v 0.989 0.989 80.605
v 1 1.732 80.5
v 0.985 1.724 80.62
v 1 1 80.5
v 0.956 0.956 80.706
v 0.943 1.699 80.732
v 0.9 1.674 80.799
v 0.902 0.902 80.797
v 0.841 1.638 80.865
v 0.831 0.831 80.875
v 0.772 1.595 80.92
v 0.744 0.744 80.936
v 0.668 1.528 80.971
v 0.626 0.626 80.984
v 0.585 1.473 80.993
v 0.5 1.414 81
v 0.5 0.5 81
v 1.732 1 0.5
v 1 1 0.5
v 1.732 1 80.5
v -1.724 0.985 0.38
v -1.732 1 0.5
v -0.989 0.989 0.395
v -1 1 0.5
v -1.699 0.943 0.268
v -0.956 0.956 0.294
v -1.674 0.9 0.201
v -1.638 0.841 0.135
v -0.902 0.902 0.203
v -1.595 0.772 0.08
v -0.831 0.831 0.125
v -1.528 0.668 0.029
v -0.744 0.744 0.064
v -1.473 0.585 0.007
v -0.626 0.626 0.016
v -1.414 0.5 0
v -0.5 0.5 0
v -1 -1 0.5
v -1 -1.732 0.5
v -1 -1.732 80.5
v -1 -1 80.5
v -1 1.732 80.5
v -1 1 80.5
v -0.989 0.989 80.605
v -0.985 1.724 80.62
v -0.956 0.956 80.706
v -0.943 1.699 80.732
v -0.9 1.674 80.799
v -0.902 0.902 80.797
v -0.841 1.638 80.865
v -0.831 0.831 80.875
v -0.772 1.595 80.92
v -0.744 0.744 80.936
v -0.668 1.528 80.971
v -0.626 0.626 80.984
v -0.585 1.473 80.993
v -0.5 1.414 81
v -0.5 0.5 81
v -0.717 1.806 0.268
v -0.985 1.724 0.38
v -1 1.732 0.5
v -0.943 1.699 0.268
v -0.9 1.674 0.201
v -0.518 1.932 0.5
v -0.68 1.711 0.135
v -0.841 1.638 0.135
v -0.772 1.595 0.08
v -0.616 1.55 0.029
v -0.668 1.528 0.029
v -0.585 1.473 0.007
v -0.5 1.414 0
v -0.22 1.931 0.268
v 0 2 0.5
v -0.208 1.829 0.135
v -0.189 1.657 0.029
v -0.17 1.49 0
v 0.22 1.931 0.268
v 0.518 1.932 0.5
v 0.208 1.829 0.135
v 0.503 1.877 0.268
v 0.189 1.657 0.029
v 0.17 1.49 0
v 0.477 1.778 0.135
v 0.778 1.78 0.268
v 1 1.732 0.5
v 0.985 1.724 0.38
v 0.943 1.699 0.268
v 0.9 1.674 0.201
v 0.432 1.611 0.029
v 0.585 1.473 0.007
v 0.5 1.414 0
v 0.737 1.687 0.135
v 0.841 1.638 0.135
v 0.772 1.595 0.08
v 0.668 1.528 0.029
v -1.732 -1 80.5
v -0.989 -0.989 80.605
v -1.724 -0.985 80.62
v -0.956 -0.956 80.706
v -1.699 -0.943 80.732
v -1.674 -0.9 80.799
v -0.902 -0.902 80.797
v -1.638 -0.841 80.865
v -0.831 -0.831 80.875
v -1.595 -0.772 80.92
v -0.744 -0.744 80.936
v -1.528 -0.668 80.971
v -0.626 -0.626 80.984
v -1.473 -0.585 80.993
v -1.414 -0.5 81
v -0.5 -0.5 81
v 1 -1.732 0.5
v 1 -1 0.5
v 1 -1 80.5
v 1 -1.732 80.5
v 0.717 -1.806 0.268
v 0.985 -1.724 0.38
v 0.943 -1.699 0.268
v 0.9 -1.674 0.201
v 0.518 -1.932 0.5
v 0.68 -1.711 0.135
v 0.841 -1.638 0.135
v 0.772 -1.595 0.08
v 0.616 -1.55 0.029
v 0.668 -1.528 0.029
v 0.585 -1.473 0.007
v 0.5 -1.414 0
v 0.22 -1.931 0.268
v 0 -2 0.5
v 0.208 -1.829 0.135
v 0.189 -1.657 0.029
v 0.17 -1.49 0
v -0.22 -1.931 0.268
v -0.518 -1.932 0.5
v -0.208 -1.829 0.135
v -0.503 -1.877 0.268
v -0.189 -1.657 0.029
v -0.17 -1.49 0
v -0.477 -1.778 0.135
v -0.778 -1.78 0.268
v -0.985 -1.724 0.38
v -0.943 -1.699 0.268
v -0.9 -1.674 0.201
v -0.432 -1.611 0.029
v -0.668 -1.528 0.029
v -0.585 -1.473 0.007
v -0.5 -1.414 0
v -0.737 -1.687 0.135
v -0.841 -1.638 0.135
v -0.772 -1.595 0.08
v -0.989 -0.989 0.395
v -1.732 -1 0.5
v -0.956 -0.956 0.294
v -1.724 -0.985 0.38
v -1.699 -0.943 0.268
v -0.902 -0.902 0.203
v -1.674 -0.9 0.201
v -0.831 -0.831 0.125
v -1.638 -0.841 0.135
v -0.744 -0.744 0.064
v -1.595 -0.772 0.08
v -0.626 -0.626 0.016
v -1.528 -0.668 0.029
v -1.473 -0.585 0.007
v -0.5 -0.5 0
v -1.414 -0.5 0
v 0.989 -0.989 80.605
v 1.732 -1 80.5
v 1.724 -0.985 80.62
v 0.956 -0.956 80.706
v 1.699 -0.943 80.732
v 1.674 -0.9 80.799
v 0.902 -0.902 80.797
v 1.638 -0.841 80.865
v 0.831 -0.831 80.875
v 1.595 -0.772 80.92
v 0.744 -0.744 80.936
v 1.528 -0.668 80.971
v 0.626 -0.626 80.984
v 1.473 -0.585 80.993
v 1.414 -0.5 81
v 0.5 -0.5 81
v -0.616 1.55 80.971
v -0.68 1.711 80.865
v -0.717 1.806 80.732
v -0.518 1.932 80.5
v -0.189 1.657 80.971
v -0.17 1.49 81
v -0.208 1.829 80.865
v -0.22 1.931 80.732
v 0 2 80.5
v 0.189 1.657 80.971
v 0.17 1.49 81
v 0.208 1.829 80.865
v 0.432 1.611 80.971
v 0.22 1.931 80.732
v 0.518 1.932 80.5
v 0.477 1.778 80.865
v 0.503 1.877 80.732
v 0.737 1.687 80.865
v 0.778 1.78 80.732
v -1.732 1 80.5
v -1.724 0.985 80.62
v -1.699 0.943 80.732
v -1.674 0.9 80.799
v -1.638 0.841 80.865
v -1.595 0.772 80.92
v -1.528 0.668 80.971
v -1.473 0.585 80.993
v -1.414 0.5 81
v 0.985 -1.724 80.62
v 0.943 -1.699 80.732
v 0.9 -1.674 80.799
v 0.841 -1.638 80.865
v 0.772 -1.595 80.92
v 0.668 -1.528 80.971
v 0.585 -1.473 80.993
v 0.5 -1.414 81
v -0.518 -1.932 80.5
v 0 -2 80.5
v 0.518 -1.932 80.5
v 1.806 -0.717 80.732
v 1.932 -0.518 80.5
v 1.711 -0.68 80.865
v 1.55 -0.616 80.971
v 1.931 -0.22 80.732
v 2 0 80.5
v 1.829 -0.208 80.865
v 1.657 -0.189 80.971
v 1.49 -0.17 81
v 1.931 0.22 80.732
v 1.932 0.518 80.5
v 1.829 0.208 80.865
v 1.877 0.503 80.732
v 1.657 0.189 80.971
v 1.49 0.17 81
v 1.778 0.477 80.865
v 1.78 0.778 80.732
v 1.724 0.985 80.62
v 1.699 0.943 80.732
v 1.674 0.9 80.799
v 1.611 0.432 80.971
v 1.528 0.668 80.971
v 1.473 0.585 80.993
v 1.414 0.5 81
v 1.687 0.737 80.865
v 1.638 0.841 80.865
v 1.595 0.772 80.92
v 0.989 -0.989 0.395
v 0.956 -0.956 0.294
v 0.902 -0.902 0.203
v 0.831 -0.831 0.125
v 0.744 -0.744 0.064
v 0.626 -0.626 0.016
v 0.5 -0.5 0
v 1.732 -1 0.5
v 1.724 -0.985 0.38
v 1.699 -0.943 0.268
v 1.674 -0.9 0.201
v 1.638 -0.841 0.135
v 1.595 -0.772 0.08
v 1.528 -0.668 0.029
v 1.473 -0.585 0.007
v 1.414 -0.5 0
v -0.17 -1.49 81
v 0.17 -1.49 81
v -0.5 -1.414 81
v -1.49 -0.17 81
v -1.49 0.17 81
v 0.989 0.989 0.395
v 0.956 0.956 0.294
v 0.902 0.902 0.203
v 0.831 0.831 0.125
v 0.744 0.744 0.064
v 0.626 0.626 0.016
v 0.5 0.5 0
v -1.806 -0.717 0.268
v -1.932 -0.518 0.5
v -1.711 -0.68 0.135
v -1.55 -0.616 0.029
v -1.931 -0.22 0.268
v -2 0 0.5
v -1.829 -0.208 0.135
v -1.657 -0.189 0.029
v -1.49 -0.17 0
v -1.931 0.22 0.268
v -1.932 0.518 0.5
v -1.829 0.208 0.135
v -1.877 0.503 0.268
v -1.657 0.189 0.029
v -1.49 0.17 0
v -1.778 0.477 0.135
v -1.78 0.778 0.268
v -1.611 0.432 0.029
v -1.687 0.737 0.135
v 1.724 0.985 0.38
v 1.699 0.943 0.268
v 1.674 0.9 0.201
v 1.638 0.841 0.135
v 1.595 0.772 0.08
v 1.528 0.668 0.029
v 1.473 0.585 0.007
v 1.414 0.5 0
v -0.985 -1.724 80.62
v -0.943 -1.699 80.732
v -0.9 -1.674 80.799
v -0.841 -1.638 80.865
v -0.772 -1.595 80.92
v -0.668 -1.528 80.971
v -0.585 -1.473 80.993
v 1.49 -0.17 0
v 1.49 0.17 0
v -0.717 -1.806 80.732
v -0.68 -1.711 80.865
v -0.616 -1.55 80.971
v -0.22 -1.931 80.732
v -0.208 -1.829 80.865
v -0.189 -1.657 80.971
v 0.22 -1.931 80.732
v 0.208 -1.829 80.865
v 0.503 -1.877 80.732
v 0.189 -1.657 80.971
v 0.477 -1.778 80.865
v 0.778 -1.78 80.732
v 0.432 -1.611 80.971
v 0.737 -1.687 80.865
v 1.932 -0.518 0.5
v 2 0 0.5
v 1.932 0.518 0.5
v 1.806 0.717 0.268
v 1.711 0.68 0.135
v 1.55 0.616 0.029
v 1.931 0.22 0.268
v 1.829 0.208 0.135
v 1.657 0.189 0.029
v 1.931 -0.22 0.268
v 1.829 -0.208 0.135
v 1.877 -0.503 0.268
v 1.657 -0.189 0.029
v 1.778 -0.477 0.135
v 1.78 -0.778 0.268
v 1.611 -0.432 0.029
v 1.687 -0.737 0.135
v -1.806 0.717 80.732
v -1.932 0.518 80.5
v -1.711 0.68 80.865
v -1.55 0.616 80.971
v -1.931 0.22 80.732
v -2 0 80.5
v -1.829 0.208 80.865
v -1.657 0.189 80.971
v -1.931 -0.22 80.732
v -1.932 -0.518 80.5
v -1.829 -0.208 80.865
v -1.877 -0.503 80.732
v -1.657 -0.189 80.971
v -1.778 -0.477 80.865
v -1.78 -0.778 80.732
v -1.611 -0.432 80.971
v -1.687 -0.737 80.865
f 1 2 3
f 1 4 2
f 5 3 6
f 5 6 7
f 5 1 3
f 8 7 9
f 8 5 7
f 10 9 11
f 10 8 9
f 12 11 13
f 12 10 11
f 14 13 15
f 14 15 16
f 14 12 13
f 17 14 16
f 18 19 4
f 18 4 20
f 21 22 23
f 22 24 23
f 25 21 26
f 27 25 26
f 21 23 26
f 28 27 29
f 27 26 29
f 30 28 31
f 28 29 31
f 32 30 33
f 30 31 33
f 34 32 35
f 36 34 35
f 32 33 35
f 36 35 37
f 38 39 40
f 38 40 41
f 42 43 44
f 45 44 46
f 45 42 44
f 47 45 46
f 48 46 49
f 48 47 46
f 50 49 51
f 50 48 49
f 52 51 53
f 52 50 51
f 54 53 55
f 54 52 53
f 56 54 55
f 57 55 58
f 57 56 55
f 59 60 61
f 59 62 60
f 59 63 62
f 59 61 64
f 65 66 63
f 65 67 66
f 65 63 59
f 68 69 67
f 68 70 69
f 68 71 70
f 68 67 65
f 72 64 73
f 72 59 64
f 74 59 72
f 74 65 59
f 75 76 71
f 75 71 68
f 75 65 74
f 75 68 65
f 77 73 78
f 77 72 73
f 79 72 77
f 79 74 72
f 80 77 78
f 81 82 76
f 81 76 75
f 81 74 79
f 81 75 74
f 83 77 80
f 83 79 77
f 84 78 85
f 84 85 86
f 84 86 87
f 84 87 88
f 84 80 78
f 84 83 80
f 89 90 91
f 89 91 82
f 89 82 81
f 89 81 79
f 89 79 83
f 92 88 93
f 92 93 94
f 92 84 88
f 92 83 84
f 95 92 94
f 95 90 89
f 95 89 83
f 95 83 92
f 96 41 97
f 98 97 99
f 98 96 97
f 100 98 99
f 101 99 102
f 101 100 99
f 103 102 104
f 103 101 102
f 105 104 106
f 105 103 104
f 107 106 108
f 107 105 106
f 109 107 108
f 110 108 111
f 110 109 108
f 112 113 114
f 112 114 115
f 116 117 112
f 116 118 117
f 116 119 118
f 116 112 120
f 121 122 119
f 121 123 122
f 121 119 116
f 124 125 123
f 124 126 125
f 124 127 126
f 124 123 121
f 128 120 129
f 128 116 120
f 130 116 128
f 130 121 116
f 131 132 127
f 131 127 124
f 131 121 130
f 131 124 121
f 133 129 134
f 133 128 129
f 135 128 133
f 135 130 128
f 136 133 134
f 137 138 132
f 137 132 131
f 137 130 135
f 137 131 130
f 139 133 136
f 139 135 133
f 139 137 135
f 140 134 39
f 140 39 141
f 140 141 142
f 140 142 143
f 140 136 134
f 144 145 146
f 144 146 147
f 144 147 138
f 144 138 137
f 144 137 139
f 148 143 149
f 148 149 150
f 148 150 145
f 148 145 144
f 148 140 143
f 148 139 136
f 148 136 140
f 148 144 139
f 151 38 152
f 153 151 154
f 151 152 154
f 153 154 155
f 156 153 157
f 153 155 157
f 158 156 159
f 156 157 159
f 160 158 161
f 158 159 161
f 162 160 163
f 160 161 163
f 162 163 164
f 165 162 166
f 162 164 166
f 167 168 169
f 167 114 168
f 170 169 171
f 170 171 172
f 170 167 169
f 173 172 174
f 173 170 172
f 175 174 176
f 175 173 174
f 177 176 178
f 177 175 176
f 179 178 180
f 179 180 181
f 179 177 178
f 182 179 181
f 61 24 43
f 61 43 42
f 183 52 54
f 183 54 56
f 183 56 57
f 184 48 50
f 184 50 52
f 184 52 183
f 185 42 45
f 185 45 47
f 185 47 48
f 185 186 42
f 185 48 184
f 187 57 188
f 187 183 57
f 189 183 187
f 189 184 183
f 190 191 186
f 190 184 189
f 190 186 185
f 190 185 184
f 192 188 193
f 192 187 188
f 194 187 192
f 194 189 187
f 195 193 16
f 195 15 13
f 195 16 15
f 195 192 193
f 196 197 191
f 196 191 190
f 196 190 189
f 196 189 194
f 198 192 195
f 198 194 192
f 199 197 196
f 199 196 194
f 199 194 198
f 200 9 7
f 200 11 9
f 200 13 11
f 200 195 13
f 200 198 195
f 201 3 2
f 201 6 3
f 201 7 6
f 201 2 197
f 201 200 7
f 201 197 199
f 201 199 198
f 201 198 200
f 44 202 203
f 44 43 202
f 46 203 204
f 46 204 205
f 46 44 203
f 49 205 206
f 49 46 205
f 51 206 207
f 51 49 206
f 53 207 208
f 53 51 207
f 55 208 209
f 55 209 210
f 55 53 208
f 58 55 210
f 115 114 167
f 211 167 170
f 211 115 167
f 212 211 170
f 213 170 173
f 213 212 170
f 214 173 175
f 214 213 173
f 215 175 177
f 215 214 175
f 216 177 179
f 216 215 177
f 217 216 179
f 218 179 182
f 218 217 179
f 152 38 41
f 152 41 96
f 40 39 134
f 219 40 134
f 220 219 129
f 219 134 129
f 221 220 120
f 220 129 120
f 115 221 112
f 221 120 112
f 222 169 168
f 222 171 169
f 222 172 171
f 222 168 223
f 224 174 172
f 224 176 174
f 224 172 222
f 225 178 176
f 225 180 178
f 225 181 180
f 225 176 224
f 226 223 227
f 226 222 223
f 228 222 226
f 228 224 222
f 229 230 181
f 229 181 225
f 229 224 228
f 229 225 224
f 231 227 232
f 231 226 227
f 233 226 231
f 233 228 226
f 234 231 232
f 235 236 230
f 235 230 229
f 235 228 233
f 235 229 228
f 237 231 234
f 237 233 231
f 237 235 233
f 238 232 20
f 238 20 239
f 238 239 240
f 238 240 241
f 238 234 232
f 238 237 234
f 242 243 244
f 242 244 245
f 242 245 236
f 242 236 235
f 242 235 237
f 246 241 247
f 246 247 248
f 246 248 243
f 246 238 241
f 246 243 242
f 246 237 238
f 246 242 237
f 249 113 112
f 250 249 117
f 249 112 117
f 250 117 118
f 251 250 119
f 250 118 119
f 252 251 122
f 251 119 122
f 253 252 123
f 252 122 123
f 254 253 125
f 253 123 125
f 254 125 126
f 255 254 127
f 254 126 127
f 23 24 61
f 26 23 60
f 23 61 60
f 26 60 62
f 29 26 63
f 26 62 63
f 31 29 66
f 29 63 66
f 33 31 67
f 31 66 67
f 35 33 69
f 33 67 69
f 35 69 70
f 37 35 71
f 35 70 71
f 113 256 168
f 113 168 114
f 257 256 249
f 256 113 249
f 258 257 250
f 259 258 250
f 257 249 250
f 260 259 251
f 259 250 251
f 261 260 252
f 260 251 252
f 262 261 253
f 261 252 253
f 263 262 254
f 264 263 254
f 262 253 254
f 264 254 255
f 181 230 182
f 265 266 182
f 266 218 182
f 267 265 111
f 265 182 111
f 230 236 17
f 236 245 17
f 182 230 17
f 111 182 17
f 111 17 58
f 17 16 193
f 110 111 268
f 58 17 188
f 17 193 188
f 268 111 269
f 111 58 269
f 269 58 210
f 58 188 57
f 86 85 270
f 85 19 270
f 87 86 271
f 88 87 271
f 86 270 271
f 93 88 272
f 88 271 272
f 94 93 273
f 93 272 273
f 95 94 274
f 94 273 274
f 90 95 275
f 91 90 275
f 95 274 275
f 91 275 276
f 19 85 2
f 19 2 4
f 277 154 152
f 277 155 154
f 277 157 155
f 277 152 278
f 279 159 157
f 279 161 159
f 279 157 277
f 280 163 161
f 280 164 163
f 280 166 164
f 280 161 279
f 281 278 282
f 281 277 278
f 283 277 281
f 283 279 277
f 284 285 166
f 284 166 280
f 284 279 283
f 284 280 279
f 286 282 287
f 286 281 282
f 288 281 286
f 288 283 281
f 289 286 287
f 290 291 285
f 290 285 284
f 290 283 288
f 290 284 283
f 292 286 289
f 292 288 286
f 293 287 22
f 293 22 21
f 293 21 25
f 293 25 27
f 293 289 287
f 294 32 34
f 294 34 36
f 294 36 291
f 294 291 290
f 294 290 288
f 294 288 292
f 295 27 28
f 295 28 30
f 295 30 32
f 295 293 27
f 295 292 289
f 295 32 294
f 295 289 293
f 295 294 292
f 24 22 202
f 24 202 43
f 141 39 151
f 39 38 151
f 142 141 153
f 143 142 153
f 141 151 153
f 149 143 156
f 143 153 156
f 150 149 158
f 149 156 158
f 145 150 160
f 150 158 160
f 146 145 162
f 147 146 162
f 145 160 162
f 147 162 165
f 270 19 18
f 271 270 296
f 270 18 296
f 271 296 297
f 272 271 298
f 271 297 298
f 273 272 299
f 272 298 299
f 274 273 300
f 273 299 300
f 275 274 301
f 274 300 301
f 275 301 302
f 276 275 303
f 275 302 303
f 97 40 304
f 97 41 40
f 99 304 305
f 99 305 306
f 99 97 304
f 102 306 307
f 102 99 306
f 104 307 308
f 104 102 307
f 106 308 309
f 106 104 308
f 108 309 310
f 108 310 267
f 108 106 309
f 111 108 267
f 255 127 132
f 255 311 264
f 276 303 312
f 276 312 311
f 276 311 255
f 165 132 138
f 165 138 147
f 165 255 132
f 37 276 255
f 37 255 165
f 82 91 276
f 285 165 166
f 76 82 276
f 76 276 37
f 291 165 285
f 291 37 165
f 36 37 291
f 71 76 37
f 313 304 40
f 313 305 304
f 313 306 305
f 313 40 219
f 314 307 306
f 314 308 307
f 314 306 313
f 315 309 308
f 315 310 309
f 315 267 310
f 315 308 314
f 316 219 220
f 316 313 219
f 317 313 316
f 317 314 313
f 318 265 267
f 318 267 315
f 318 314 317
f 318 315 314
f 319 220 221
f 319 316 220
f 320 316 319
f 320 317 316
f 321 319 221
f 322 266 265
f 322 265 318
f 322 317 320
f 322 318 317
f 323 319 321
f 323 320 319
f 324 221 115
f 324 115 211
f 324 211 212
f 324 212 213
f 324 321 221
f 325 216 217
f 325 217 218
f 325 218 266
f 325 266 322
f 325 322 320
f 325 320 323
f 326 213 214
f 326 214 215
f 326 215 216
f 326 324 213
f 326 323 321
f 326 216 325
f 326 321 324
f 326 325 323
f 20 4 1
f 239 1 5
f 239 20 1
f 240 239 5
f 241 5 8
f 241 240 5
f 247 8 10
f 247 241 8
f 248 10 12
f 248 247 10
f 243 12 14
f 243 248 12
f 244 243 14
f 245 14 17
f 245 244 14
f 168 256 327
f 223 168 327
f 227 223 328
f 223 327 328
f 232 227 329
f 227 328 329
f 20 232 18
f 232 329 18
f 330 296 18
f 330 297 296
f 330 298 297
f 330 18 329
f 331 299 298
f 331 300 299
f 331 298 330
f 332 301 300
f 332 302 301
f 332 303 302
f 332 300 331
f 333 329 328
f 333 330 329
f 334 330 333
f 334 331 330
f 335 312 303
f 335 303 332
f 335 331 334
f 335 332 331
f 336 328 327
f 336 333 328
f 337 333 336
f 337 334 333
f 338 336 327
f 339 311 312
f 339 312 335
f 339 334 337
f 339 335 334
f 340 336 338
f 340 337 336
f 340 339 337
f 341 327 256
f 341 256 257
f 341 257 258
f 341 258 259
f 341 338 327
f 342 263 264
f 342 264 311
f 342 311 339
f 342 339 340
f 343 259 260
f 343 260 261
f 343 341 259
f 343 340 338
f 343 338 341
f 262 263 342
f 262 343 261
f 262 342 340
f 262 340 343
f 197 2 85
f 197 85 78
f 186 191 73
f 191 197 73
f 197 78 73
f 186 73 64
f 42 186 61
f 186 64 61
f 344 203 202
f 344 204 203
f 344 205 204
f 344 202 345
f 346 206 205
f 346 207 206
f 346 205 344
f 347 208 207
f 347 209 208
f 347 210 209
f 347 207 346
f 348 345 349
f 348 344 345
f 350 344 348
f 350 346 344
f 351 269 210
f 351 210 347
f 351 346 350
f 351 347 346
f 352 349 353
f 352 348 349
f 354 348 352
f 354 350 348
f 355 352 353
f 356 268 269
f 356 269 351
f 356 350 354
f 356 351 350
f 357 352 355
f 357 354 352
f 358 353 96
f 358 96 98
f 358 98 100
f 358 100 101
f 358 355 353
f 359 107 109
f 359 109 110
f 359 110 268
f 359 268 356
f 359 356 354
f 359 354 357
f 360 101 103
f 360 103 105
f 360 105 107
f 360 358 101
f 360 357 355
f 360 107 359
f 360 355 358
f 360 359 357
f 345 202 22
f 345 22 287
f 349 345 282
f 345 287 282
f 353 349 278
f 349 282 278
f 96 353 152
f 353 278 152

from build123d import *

# Parameters (mm, degrees)
BOSS_EXTRUDE1_DEPTH = 81
SKETCH2_OUTSIDE_W   = 22.24
SKETCH2_OUTSIDE_H   = 22.24
SKETCH2_OUTSIDE_R   = 2
CUT_EXTRUDE3_DEPTH  = 82
FILLET1_R           = 0.5


with BuildPart() as part:
    # Sketch1 → Boss-Extrude1 (new body)
    with BuildSketch(Plane.XY):
        Polygon((-1, 1), (-1, 2), (1, 2), (1, 1), (2, 1), (2, -1), (1, -1), (1, -2), (-1, -2), (-1, -1), (-2, -1), (-2, 1), align=None)
    extrude(amount=BOSS_EXTRUDE1_DEPTH)

    # Sketch2 outside → Cut-Extrude3 (cut, through all)
    with BuildSketch(Plane.XY):
        Rectangle(SKETCH2_OUTSIDE_W, SKETCH2_OUTSIDE_H)
        Circle(SKETCH2_OUTSIDE_R, mode=Mode.SUBTRACT)
    extrude(amount=CUT_EXTRUDE3_DEPTH, mode=Mode.SUBTRACT)

    # Fillet1
    fillet1_edges = [part.edges().sort_by_distance(p)[0] for p in [
        (1.366025404, -1, 0),
        (-1, -1.366025404, 0),
        (-1.366025404, 1, 0),
        (1, 1.366025404, 0),
        (-1.366025404, 1, 81),
        (-1, -1.366025404, 81),
        (1.366025404, 1, 0),
        (1, -1.366025404, 0),
        (-1.366025404, -1, 0),
        (-1, 1.366025404, 0),
        (-2, 0, 0),
        (0, 2, 0),
        (2, 0, 0),
        (0, -2, 0),
        (1.366025404, -1, 81),
        (-1, 1.366025404, 81),
        (-1.366025404, -1, 81),
        (1, -1.366025404, 81),
        (1.366025404, 1, 81),
        (1, 1.366025404, 81),
        (0, 2, 81),
        (-2, 0, 81),
        (0, -2, 81),
        (2, 0, 81),
    ]]
    fillet(fillet1_edges, radius=FILLET1_R)


solid = part.part
